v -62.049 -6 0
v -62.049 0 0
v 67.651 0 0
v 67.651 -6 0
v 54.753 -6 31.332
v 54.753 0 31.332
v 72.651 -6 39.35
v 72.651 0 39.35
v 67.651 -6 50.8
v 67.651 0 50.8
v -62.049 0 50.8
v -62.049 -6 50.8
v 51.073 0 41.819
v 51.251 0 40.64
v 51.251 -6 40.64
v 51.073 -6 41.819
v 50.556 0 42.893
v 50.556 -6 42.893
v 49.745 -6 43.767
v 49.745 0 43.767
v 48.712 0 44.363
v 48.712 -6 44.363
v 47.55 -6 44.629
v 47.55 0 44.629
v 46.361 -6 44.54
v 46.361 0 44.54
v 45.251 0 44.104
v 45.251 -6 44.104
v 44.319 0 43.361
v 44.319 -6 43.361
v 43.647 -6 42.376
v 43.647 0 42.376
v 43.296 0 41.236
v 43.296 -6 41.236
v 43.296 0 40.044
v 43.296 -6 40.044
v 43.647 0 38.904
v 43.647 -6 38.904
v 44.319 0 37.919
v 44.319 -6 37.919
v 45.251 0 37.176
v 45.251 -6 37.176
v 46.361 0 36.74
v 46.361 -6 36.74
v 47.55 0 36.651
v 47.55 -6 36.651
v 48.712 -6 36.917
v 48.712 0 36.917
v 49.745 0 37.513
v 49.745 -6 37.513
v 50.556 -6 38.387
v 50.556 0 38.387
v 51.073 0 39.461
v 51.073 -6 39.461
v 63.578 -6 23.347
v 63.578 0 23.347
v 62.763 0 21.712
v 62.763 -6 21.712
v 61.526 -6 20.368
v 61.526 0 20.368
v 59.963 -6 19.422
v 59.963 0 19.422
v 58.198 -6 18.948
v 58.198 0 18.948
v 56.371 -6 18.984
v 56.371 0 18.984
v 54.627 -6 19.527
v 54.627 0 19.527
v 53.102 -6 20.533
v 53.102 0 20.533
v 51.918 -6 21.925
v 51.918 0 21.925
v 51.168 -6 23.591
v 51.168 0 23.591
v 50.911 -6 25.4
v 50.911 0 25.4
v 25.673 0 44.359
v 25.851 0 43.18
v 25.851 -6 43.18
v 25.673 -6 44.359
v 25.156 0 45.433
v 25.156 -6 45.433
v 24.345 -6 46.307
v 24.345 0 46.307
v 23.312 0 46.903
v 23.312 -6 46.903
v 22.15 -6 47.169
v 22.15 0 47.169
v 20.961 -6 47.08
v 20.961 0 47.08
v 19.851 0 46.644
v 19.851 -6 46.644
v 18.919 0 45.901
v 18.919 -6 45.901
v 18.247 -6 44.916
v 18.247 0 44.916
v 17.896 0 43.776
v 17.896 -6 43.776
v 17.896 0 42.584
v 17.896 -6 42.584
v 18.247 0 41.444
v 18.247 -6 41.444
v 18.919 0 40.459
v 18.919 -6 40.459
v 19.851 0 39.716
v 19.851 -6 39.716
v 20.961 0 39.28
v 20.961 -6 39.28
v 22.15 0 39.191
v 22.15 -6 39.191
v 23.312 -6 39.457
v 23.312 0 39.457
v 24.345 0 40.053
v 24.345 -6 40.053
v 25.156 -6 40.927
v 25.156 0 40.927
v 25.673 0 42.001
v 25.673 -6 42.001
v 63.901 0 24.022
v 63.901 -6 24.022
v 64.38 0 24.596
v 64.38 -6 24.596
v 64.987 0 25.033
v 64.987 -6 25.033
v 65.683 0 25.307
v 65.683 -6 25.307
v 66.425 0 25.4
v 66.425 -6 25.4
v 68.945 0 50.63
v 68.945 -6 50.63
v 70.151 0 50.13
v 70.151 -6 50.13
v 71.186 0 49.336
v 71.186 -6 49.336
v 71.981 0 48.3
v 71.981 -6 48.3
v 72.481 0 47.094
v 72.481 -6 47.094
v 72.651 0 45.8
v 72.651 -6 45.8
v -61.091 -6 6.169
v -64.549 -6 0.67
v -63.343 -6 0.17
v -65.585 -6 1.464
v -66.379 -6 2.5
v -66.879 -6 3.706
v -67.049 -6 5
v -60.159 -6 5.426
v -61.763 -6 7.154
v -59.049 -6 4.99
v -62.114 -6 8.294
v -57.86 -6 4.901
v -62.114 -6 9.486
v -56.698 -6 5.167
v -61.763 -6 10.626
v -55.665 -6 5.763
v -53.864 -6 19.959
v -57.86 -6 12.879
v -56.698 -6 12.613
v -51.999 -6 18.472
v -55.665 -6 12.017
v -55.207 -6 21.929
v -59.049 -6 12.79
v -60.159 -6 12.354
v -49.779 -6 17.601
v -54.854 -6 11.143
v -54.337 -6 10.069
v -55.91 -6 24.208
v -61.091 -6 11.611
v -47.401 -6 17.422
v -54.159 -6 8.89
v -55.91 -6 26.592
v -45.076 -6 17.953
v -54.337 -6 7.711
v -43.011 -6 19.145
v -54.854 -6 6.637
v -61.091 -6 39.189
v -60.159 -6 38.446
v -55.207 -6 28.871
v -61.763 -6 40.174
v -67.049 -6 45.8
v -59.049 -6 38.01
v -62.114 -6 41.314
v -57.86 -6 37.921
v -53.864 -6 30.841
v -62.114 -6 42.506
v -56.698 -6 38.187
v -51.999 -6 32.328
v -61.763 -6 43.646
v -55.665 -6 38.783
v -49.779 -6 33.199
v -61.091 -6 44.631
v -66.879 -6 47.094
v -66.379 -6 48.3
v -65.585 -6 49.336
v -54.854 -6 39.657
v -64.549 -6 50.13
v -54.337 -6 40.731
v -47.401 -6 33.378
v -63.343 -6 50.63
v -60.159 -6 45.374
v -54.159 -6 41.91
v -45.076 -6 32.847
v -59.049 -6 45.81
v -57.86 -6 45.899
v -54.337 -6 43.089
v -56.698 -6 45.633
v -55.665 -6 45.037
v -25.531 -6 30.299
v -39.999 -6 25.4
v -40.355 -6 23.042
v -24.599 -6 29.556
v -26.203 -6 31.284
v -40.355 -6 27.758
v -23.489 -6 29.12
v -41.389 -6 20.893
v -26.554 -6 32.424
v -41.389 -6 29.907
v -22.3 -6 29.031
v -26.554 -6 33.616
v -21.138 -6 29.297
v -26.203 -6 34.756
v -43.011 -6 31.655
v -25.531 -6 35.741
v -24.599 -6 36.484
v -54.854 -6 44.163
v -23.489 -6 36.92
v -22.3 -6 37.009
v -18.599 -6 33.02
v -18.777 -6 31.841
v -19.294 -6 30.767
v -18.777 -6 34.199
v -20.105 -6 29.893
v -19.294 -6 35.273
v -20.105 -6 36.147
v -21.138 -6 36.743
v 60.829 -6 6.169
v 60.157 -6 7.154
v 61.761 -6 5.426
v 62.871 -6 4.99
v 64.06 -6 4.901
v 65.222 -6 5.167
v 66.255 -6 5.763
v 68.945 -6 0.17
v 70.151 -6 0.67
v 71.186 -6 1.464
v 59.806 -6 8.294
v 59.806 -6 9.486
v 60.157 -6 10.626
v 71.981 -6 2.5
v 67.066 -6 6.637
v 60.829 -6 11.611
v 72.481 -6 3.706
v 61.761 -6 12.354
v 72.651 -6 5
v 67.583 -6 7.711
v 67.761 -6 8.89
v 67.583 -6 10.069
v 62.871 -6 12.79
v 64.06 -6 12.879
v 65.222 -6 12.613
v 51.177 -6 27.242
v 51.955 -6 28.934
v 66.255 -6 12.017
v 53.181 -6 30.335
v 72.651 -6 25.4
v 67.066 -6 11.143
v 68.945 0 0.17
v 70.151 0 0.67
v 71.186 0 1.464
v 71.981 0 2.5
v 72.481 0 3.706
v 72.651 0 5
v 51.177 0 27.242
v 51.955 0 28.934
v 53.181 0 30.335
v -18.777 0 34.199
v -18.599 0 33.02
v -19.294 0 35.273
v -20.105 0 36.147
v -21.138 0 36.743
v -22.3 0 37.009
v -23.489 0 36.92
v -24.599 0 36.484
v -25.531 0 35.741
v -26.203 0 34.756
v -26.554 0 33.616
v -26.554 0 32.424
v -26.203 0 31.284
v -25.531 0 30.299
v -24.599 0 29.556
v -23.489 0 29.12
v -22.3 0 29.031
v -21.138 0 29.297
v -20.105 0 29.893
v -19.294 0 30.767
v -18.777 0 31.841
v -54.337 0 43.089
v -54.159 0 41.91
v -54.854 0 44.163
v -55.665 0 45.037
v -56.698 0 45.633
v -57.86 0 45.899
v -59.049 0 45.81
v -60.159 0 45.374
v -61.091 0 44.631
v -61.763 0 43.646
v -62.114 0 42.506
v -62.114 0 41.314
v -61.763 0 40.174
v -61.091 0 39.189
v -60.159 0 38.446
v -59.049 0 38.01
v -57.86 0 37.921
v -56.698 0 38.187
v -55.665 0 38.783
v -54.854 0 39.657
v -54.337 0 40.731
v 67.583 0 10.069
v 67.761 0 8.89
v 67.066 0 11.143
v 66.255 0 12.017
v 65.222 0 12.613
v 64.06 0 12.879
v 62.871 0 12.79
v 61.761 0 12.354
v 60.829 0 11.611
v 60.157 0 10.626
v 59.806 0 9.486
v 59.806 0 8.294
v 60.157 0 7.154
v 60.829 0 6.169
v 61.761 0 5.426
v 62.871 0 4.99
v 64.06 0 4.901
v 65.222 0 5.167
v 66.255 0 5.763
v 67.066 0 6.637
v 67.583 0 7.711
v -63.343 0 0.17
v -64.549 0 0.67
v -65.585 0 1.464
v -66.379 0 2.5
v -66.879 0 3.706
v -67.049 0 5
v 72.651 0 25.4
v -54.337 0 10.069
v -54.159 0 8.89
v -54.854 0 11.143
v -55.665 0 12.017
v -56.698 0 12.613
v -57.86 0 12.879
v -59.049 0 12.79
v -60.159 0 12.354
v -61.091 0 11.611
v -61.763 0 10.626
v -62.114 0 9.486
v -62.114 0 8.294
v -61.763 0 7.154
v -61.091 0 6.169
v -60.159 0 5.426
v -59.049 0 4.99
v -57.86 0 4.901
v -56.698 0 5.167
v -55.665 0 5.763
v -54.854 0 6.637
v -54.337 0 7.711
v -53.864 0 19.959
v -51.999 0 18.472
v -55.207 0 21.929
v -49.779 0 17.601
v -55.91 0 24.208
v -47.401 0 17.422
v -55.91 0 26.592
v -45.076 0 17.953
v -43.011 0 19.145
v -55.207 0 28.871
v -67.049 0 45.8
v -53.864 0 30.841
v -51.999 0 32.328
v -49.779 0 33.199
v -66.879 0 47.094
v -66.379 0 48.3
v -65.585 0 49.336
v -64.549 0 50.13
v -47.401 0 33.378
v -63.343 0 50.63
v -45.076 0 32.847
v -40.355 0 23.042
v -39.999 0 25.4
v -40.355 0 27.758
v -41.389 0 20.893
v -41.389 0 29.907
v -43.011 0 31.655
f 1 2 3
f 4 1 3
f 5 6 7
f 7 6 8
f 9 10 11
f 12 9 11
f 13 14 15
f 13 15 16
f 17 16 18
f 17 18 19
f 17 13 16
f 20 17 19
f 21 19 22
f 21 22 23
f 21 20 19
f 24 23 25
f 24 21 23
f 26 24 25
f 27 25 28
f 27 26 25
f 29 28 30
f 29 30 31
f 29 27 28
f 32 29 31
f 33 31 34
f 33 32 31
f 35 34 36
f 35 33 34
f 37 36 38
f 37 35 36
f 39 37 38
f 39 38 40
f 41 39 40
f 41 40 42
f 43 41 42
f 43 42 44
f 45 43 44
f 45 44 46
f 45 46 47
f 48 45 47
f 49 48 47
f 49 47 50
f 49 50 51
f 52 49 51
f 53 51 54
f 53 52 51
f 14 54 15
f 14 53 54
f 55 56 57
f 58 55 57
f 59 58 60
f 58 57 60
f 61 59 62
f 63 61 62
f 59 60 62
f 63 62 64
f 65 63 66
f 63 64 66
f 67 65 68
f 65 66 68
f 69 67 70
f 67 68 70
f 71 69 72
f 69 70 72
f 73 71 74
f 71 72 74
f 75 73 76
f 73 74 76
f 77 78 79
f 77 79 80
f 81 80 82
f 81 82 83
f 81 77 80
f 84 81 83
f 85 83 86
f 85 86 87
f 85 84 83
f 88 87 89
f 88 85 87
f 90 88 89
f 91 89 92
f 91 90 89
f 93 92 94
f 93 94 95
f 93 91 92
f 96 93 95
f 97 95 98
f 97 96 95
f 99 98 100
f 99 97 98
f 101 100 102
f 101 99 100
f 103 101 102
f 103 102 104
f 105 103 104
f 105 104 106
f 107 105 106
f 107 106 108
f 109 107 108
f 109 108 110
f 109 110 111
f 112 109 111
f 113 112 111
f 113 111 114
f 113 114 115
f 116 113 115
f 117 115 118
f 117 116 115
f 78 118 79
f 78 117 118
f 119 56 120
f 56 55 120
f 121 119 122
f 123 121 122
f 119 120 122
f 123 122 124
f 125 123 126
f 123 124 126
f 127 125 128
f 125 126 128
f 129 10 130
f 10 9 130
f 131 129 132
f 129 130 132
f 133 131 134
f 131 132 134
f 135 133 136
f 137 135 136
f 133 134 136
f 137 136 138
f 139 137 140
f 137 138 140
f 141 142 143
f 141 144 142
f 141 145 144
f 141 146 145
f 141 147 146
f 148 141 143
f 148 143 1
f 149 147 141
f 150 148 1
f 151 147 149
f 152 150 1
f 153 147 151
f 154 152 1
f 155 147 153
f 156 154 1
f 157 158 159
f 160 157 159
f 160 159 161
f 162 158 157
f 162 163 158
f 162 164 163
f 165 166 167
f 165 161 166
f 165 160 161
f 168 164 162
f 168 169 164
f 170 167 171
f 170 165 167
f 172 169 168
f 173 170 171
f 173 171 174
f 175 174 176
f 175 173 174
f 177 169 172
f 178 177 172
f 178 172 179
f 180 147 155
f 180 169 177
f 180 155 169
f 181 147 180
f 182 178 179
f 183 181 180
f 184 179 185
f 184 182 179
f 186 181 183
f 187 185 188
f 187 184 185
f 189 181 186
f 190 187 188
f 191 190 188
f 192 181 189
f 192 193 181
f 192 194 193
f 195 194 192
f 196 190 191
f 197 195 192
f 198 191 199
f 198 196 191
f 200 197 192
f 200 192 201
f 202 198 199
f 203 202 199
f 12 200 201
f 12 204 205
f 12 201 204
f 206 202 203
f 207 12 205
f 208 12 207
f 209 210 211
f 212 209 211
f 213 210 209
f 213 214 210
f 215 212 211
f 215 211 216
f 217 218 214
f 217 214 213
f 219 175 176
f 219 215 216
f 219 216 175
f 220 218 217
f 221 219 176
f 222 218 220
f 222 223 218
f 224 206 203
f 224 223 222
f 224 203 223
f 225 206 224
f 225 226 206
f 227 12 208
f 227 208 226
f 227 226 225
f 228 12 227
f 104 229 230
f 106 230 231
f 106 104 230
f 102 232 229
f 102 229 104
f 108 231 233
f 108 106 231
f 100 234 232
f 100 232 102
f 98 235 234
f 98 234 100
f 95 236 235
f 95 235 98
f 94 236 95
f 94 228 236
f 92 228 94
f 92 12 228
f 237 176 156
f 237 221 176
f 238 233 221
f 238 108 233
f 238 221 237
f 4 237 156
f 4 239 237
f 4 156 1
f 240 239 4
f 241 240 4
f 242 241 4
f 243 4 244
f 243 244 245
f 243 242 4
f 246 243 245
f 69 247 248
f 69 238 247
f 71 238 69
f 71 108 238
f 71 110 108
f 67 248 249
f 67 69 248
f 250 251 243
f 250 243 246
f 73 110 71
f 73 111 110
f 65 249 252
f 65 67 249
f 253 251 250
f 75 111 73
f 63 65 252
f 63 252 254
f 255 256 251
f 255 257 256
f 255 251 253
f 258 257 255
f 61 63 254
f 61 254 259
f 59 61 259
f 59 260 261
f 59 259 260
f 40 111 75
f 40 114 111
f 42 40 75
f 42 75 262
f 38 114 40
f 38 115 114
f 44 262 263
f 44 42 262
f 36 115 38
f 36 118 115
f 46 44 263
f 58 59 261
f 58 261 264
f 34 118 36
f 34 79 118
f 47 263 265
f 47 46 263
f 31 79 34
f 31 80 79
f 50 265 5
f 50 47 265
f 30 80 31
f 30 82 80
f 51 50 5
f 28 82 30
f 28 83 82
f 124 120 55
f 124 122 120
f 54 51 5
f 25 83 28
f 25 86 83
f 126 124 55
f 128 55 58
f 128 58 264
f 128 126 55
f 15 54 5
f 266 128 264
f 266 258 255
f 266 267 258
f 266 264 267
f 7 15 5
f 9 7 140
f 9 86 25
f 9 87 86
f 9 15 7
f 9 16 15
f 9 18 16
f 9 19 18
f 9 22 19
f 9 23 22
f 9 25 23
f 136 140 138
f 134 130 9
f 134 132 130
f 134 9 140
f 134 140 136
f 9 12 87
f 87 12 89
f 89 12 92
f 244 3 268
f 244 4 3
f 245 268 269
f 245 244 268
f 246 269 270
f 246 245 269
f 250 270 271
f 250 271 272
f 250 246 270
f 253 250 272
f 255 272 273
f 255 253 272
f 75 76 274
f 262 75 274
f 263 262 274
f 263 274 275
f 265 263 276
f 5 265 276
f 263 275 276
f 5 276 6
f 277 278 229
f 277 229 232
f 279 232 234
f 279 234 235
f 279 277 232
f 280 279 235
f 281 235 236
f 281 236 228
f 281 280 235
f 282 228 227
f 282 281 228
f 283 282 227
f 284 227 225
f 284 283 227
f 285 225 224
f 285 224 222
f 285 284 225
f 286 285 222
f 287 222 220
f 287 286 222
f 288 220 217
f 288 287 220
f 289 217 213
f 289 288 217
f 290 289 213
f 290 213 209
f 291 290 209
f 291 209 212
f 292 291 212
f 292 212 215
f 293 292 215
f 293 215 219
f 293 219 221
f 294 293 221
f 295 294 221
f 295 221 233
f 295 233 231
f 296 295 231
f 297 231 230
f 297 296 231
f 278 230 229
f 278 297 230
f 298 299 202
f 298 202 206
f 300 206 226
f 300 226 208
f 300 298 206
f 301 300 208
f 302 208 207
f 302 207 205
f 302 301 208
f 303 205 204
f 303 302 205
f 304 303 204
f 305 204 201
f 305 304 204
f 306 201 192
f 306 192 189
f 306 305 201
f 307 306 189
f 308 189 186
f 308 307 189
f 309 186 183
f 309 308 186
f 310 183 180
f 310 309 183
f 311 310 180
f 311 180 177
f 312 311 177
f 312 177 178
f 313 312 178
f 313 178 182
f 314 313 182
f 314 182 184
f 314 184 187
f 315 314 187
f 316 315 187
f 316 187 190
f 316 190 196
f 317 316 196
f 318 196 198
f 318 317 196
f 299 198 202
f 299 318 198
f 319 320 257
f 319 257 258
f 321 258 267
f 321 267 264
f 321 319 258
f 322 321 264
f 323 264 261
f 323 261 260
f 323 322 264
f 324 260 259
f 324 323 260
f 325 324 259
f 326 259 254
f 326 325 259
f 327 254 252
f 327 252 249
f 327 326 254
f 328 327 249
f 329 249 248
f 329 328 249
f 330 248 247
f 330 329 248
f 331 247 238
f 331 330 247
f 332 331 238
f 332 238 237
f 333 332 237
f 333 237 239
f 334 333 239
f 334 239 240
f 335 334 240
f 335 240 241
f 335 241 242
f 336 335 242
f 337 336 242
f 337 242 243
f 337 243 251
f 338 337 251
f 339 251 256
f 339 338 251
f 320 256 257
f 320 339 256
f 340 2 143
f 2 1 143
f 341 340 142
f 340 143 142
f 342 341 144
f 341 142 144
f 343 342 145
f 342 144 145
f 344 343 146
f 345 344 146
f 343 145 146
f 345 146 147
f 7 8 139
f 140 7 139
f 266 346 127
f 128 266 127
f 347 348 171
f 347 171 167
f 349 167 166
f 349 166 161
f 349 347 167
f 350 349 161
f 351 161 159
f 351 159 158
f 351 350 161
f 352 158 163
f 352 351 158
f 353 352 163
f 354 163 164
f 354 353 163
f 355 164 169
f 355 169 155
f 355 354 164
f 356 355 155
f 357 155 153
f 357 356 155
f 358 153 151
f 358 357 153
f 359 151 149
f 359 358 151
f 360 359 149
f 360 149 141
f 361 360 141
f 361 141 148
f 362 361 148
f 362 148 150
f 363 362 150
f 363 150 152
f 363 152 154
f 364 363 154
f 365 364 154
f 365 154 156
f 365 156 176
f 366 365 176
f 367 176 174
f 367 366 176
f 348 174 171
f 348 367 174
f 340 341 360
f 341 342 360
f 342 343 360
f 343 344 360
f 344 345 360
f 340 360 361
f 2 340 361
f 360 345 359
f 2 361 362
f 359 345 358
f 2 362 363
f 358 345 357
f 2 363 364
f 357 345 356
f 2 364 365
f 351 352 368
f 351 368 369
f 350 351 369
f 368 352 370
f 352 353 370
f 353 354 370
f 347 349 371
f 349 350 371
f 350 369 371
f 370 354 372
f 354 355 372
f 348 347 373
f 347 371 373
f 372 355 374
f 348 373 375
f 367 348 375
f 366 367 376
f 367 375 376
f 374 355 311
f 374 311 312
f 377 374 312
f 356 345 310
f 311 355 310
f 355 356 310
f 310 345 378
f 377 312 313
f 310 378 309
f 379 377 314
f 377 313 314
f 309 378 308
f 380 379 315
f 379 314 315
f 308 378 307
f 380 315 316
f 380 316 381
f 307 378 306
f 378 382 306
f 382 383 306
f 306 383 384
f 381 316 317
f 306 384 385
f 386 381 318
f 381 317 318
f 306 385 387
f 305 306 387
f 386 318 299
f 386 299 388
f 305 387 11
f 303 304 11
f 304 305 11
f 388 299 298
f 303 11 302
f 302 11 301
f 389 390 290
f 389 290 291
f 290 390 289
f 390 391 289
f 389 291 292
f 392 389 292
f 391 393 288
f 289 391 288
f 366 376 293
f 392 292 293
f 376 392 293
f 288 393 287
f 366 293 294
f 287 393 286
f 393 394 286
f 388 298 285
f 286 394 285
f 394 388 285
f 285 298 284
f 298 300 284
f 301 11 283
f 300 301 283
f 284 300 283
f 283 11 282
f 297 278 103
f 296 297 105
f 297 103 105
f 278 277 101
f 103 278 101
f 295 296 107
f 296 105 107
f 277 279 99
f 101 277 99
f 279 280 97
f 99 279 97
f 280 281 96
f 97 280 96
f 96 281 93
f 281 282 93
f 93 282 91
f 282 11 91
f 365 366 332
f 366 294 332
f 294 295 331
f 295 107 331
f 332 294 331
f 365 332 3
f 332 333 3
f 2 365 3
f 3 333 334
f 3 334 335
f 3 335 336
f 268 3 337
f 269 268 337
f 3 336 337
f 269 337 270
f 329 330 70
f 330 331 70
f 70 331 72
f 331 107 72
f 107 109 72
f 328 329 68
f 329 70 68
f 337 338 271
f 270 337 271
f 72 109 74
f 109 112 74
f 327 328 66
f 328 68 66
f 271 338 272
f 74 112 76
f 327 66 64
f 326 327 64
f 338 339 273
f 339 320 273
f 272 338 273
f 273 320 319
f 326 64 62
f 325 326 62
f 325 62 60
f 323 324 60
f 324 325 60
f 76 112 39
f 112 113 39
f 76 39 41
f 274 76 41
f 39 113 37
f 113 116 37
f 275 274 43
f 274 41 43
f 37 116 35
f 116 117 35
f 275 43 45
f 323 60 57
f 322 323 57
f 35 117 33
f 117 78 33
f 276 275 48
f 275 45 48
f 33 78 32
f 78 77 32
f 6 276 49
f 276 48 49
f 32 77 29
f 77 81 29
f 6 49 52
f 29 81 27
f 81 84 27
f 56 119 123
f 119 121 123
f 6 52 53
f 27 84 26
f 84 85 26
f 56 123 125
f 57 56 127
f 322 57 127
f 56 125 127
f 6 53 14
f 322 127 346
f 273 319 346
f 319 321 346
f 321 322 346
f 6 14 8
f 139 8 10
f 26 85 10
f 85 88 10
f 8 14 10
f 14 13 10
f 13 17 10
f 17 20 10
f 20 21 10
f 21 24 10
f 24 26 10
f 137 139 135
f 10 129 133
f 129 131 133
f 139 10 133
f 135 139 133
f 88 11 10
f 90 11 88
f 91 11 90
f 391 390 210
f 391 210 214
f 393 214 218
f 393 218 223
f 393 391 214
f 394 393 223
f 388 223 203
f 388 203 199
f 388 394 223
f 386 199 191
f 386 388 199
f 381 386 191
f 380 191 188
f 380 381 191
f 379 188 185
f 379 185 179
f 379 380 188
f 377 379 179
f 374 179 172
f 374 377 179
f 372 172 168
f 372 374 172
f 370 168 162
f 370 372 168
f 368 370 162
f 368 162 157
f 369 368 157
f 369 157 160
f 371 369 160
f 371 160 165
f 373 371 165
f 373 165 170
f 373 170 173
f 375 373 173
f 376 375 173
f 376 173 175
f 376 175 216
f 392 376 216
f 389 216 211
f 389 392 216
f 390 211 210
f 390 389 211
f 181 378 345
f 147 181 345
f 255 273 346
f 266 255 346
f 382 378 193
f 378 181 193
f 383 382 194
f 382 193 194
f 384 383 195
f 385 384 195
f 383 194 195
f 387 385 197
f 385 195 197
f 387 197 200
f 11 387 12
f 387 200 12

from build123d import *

# Parameters (mm, degrees)
F0_R     = 4
F0_R_2   = 8
F1_DEPTH = 6
F2_R     = 5
F3_R     = 5
F4_R     = 3


with BuildPart() as f1:
    # F0 (on Front) → F1 (new body)
    with BuildSketch(Plane.XZ):
        with BuildLine():
            Line((-67.0491158962, 8.89), (-67.0491158962, 0))
            Line((-67.0491158962, 0), (72.6508841038, 0))
            Line((72.6508841038, 0), (72.6508841038, 25.4))
            Line((72.6508841038, 25.4), (63.9108841038, 25.4))
            ThreePointArc((63.9108841038, 25.4), (57.4108841038, 18.9), (50.9108841038, 25.4))
            ThreePointArc((50.9108841038, 25.4), (51.9554394899, 28.933853996), (54.7533838162, 31.3319214612))
            Line((54.7533838162, 31.3319214612), (72.6508841038, 39.35))
            Line((72.6508841038, 39.35), (72.6508841038, 50.8))
            Line((72.6508841038, 50.8), (47.2508841038, 50.8))
            Line((47.2508841038, 50.8), (21.8508841038, 50.8))
            Line((21.8508841038, 50.8), (-22.5991158962, 50.8))
            Line((-22.5991158962, 50.8), (-67.0491158962, 50.8))
            Line((-67.0491158962, 50.8), (-67.0491158962, 41.91))
            Line((-67.0491158962, 41.91), (-67.0491158962, 8.89))
        make_face()
        with Locations((-58.1591158962, 8.89)):
            Circle(F0_R, mode=Mode.SUBTRACT)
        with Locations((-47.9991158962, 25.4)):
            Circle(F0_R_2, mode=Mode.SUBTRACT)
        with Locations((63.7608841038, 8.89)):
            Circle(F0_R, mode=Mode.SUBTRACT)
        with Locations((-22.5991158962, 33.02)):
            Circle(F0_R, mode=Mode.SUBTRACT)
        with Locations((-58.1591158962, 41.91)):
            Circle(F0_R, mode=Mode.SUBTRACT)
        with Locations((21.8508841038, 43.18)):
            Circle(F0_R, mode=Mode.SUBTRACT)
        with Locations((47.2508841038, 40.64)):
            Circle(F0_R, mode=Mode.SUBTRACT)
    extrude(amount=F1_DEPTH)

    # F2
    f2_edges = [f1.edges().sort_by_distance(p)[0] for p in [
        (-67.049116, -3, 50.8),
        (-67.049116, -3, 0),
        (72.650884, -3, 0),
    ]]
    fillet(f2_edges, radius=F2_R)

    # F3
    f3_edges = [f1.edges().sort_by_distance(p)[0] for p in [
        (72.650884, -3, 50.8),
    ]]
    fillet(f3_edges, radius=F3_R)

    # F4
    f4_edges = [f1.edges().sort_by_distance(p)[0] for p in [
        (63.910884, -3, 25.4),
    ]]
    fillet(f4_edges, radius=F4_R)


solid = f1.part
